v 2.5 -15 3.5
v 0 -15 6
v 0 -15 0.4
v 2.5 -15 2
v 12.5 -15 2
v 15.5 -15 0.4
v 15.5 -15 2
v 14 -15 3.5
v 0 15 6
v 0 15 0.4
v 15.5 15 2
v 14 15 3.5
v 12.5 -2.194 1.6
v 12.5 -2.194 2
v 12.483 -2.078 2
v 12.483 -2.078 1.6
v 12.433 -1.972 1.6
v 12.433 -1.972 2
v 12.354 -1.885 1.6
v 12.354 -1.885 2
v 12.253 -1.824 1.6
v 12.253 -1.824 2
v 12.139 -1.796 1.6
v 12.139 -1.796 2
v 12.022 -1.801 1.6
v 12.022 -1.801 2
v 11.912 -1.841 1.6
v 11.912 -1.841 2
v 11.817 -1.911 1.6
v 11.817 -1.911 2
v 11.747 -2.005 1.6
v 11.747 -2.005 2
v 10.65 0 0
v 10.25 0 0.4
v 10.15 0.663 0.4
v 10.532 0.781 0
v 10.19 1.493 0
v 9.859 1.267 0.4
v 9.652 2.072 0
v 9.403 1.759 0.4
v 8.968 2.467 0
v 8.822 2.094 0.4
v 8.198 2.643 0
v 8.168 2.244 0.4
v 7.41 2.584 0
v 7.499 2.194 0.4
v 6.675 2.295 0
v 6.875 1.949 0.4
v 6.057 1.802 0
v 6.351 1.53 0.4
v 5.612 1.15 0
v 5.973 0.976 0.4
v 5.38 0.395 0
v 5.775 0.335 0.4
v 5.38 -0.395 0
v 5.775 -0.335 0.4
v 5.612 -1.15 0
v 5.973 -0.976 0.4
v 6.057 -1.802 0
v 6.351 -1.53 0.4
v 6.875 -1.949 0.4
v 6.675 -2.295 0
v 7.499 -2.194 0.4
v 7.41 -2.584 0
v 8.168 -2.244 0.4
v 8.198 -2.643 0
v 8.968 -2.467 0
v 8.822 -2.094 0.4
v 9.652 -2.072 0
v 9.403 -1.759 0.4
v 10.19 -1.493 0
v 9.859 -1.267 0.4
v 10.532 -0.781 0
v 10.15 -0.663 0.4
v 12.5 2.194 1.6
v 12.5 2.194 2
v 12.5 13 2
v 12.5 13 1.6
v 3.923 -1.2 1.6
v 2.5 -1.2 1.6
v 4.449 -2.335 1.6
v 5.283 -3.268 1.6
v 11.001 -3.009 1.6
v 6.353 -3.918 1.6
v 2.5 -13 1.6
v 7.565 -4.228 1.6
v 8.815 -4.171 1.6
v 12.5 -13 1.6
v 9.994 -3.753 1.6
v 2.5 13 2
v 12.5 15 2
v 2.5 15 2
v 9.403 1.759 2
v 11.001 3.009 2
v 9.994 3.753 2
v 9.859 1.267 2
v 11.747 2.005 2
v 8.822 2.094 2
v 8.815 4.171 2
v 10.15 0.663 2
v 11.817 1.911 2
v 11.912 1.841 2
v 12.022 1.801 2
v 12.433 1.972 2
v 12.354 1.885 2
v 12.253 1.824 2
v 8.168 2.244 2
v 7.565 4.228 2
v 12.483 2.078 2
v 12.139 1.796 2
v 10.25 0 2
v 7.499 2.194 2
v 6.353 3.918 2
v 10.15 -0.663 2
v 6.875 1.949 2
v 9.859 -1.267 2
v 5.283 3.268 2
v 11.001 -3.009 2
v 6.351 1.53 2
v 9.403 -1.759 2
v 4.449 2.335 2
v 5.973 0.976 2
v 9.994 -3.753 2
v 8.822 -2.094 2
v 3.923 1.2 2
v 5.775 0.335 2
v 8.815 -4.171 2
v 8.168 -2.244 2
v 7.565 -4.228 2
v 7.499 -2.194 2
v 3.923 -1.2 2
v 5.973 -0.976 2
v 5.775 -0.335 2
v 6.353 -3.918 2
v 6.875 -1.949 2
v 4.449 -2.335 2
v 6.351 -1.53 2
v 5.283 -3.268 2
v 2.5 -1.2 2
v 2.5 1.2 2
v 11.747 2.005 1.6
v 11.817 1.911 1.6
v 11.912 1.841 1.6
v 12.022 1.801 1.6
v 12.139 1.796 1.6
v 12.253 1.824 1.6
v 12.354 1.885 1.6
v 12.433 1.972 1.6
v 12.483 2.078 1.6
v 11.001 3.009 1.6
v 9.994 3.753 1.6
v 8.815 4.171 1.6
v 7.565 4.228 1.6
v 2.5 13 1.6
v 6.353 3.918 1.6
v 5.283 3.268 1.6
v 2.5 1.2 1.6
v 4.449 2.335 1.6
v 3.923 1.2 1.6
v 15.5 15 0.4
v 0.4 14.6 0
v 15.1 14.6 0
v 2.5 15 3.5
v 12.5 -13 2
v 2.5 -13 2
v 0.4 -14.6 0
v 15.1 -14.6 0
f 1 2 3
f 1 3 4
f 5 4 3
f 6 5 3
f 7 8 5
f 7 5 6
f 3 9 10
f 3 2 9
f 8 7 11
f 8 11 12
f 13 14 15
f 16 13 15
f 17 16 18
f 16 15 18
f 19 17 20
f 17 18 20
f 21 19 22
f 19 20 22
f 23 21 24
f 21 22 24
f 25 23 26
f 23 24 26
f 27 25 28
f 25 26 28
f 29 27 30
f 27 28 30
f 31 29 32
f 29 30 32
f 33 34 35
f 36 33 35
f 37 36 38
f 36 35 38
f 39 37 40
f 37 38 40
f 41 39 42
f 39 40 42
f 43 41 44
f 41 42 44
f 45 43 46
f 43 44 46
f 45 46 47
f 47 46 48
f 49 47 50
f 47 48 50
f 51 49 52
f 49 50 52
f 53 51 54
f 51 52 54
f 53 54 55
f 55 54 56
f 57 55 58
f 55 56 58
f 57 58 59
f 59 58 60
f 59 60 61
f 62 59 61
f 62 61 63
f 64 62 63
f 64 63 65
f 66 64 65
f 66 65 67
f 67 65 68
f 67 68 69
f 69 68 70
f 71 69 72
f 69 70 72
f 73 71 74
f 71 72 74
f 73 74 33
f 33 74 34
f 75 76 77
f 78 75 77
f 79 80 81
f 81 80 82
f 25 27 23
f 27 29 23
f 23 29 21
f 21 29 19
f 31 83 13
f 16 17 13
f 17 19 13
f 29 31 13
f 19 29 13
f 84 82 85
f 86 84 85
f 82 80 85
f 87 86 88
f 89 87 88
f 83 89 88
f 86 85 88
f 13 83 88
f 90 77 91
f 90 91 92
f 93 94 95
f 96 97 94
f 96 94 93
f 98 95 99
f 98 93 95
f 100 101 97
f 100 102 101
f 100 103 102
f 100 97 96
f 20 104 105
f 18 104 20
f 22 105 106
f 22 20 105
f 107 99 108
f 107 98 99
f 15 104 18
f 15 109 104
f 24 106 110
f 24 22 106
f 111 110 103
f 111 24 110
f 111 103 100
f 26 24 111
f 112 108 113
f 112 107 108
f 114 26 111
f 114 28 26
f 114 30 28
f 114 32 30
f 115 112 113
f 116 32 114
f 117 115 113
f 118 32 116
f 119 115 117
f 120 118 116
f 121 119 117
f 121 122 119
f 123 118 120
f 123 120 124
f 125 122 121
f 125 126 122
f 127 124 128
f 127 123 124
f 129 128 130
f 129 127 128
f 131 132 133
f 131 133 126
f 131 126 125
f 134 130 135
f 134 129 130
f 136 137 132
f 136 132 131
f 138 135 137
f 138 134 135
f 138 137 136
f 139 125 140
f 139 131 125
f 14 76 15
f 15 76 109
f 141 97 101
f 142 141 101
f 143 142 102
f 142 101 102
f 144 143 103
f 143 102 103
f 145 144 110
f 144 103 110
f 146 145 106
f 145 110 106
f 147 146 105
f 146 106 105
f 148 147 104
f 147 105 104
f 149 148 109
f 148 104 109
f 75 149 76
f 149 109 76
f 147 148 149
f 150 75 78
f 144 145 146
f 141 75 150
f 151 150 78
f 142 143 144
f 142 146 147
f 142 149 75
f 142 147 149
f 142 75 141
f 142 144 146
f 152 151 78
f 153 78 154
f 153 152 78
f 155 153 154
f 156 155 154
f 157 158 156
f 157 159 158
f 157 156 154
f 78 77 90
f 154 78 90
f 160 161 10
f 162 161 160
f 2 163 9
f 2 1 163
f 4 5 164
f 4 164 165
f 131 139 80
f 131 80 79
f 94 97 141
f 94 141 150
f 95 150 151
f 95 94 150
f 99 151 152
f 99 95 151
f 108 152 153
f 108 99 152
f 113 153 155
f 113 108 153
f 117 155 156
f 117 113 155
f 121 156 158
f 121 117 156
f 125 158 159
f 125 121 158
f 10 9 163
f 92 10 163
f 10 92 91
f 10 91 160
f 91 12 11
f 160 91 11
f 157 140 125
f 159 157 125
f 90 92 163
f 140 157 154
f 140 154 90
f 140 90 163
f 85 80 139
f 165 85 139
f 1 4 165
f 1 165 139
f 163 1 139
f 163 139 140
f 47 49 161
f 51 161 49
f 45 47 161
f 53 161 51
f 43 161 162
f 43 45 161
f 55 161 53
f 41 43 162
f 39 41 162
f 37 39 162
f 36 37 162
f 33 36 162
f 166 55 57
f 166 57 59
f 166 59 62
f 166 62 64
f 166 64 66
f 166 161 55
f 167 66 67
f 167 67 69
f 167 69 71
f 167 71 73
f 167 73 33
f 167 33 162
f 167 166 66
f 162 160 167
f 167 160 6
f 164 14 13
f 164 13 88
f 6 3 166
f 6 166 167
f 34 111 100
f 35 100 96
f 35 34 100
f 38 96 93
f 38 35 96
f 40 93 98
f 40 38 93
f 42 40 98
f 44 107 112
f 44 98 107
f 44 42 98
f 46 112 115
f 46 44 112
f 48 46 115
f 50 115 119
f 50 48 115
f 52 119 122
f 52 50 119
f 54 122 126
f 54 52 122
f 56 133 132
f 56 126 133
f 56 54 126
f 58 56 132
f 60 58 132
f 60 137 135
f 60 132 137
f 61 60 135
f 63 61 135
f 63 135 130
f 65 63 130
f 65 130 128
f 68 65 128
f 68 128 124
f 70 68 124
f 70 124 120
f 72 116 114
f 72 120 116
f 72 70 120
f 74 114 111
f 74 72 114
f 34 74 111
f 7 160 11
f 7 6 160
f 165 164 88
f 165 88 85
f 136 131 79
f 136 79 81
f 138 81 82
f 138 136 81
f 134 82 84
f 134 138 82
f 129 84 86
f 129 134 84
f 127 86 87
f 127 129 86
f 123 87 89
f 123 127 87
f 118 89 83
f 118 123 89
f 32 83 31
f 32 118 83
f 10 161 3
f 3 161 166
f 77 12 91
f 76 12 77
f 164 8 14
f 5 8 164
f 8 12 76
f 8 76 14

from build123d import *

# Parameters (mm, degrees)
PAD_DEPTH       = 15
SKETCH001_R     = 2.25
HOLE_DEPTH      = 6.001
POCKET010_DEPTH = 0.4
CHAMFER004_SIZE = 0.4


with BuildPart() as part:
    # Sketch → Pad (new body, symmetric)
    with BuildSketch(Plane.XZ):
        Polygon((0, 6), (0, 0), (15.5, 0), (15.5, 2), (14, 3.5), (12.5, 2), (2.5, 2), (2.5, 3.5), align=None)
    extrude(amount=PAD_DEPTH, both=True)

    # Sketch001 → Hole (cut, through all)
    with BuildSketch(Plane.XY):
        with Locations((8, 0)):
            Circle(SKETCH001_R)
    extrude(amount=HOLE_DEPTH, mode=Mode.SUBTRACT)

    # Sketch013 (on Face11 of Hole) → Pocket010 (cut)
    with BuildSketch(Plane(origin=(0, 0, 2), x_dir=(-1, 0, 0), z_dir=(0, 0, 1))):
        with BuildLine():
            Line((-12.5, 13), (-2.5, 13))
            Line((-2.5, 13), (-2.5, 1.2))
            Line((-2.5, 1.2), (-3.92293, 1.2))
            ThreePointArc((-3.92293, 1.2), (-7.565024, 4.227682), (-11.747312, 2.005032))
            ThreePointArc((-12.5, 2.193741), (-12.197275, 1.805749), (-11.747312, 2.005032))
            Line((-12.5, 2.193741), (-12.5, 13))
        make_face()
        with BuildLine():
            Line((-12.5, -13), (-2.5, -13))
            Line((-2.5, -13), (-2.5, -1.2))
            Line((-2.5, -1.2), (-3.92293, -1.2))
            ThreePointArc((-11.747312, -2.005032), (-7.565024, -4.227682), (-3.92293, -1.2))
            ThreePointArc((-11.747312, -2.005032), (-12.197275, -1.805749), (-12.5, -2.193741))
            Line((-12.5, -2.193741), (-12.5, -13))
        make_face()
    extrude(amount=-POCKET010_DEPTH, mode=Mode.SUBTRACT)

    # Chamfer004
    chamfer004_edges = [part.edges().sort_by_distance(p)[0] for p in [
        (0, 0, 0),
        (7.75, 15, 0),
        (7.75, -15, 0),
        (15.5, 0, 0),
        (10.25, 0, 0),
    ]]
    chamfer(chamfer004_edges, length=CHAMFER004_SIZE)


solid = part.part
